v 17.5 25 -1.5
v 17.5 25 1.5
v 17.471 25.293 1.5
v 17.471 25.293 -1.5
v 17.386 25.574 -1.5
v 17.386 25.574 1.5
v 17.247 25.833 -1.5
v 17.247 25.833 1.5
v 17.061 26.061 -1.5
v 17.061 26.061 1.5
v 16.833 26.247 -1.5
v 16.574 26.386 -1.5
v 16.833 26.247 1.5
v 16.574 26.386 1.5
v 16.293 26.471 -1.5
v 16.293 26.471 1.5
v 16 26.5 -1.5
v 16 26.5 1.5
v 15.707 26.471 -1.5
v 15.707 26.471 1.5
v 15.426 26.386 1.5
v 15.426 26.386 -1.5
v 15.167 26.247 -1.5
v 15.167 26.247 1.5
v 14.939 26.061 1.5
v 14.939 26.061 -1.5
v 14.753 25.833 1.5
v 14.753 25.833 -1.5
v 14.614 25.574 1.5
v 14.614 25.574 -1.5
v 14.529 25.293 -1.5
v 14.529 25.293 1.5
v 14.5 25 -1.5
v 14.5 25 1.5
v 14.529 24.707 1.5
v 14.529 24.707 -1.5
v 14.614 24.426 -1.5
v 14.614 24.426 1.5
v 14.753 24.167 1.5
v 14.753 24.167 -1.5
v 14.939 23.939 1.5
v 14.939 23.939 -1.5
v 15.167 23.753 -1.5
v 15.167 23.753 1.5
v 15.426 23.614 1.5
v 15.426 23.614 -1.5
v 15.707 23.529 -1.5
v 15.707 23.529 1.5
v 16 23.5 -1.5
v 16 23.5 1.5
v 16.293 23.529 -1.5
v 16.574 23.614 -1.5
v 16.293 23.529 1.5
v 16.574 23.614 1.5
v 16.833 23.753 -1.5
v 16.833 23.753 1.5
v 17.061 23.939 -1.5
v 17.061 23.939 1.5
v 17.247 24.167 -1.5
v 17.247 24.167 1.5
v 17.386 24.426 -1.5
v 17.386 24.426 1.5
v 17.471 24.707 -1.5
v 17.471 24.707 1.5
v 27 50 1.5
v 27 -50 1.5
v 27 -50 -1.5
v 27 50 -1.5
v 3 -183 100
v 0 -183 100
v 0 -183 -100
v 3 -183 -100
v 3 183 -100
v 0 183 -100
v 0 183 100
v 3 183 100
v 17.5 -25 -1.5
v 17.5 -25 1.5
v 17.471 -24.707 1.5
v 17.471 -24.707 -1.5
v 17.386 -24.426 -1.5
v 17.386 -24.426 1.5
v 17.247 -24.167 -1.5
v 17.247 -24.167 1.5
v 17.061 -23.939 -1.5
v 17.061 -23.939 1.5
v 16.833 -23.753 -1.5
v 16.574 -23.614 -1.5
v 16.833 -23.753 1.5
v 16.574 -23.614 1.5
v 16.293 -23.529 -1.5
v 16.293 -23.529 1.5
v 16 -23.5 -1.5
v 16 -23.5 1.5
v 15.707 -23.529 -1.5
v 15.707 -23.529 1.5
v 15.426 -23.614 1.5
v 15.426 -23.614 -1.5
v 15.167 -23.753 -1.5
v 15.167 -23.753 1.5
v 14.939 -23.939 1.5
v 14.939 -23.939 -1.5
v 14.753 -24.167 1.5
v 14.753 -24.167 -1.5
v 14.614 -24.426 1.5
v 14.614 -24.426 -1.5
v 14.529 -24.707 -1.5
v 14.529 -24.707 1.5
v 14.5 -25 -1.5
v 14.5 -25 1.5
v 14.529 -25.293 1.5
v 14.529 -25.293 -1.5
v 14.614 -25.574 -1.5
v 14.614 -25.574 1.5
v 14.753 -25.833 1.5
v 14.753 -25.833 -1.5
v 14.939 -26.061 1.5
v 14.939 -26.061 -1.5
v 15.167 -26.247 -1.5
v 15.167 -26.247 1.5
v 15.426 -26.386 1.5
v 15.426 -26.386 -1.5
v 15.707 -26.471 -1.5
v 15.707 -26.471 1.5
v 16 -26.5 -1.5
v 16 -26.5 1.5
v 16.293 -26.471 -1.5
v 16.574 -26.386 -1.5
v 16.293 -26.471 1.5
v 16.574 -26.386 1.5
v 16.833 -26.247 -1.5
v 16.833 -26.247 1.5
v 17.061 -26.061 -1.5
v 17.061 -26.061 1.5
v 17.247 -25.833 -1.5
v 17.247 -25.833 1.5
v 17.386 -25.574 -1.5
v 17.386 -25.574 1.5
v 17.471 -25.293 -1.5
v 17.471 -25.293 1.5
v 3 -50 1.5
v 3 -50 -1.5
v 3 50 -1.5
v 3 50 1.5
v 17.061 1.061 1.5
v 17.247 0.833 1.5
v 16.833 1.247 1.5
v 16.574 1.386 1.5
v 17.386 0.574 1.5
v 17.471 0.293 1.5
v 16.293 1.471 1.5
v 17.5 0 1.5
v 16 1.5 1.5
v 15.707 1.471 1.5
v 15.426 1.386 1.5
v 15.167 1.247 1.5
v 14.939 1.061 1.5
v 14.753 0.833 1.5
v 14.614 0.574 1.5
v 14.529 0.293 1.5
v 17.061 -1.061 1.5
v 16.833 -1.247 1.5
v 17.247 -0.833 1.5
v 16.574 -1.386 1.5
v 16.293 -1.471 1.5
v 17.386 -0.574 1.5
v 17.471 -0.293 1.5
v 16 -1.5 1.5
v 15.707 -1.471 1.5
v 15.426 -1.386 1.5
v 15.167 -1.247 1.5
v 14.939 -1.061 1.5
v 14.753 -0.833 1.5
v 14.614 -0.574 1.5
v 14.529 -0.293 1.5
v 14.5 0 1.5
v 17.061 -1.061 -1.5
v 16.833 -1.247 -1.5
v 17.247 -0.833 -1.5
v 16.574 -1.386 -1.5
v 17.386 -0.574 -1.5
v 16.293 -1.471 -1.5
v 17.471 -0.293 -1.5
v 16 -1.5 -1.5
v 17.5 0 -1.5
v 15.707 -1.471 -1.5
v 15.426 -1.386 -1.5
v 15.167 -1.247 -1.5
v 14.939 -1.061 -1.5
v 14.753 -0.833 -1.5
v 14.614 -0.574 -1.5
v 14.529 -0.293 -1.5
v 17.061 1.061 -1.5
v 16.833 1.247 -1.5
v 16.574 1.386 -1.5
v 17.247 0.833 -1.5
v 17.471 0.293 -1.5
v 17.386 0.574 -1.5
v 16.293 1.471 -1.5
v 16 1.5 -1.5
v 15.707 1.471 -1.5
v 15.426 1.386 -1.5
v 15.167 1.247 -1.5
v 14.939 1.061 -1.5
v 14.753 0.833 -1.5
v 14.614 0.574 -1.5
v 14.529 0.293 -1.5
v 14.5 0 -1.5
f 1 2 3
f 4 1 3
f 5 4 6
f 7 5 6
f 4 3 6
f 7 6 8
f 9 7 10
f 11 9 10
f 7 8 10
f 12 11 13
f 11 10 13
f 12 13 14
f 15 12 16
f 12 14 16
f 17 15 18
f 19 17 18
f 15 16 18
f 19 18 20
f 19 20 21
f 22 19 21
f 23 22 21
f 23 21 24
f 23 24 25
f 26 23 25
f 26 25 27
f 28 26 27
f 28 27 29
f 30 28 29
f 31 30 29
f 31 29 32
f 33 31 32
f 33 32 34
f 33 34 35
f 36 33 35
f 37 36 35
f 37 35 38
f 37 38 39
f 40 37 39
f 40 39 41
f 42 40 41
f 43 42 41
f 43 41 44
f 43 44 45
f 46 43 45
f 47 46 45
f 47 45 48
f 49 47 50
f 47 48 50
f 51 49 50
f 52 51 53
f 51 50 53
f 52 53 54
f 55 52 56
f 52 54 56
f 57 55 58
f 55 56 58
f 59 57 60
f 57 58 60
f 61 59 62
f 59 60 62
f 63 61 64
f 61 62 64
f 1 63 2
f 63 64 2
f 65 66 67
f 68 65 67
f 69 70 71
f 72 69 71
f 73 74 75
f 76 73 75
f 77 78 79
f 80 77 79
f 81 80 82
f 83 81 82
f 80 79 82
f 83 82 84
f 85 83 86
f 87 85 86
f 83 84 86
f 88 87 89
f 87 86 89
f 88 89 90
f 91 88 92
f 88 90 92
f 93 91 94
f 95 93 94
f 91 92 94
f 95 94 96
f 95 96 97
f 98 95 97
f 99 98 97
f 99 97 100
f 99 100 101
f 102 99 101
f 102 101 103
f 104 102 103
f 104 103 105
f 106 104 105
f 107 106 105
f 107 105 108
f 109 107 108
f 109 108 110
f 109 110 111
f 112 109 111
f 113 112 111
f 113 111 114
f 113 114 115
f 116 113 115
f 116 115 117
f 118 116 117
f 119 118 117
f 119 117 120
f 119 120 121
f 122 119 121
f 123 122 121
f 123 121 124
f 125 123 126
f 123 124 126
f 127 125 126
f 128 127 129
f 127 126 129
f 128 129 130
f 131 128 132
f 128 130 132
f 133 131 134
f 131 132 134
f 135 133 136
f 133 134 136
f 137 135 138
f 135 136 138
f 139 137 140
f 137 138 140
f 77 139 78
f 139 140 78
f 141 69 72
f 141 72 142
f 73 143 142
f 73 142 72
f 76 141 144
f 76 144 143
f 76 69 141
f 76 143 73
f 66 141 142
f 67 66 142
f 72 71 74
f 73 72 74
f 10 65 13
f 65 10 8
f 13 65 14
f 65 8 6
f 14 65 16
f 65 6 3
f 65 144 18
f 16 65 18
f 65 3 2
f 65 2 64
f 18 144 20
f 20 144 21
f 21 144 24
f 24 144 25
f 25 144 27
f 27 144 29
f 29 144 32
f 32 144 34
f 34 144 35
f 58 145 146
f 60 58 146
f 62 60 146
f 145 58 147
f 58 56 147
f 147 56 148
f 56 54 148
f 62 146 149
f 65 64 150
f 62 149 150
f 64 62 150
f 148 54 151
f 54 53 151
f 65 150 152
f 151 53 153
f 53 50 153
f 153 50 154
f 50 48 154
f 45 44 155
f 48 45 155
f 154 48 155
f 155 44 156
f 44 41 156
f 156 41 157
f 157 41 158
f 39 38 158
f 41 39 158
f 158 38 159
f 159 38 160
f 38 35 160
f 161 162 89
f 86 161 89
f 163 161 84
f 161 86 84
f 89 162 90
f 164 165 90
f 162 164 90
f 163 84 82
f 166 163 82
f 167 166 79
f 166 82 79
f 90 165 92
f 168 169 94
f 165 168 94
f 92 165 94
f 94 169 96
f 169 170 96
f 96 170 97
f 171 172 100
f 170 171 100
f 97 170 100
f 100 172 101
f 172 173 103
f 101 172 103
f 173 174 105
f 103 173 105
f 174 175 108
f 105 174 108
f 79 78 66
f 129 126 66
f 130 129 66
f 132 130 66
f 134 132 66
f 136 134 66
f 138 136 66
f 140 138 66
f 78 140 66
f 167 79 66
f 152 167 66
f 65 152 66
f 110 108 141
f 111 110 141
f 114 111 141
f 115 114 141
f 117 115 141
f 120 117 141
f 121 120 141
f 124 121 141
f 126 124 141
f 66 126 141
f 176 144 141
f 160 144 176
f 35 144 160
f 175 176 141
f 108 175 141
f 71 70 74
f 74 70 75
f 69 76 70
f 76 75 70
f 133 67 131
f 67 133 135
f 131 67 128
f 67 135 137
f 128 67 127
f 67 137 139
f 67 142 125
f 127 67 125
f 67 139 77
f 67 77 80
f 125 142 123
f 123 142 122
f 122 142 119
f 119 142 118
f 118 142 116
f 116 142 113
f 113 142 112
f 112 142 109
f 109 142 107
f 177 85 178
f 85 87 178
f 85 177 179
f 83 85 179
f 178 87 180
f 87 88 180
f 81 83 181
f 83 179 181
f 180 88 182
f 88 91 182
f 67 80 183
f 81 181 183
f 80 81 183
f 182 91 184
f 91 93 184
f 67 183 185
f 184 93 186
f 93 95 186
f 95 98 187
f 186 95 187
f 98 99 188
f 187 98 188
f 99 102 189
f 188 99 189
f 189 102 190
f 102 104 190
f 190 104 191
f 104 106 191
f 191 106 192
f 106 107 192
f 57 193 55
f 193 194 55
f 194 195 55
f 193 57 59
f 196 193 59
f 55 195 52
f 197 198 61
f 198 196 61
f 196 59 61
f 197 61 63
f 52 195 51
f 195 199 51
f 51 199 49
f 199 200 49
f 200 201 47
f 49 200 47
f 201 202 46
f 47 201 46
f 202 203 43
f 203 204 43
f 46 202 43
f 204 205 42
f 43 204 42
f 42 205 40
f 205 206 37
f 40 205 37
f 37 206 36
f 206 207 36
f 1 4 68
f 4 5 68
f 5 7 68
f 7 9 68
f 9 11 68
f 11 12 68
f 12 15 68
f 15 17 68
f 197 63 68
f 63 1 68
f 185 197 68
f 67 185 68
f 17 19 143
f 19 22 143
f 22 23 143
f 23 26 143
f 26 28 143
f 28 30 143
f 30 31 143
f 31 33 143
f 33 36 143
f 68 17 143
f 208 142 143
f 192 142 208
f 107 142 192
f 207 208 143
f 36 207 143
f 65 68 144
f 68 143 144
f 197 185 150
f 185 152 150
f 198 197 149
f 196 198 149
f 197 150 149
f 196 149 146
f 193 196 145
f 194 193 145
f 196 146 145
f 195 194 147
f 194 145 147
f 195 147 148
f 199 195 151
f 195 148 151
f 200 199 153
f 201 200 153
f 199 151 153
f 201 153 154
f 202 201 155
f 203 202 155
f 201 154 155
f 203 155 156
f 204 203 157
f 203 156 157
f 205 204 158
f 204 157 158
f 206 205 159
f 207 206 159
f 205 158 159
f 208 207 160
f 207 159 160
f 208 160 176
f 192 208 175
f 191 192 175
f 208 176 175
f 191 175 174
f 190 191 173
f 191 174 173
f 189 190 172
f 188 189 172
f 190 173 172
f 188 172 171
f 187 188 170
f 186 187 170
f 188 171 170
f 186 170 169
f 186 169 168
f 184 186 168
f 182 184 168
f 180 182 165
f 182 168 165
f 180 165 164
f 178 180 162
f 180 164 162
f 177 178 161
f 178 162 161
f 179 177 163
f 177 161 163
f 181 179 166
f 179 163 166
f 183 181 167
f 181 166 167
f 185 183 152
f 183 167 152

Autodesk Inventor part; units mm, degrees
ref_plane "YZ Plane" through (0, 0, 0) normal (1, 0, 0) x (0, 1, 0)
ref_plane "XZ Plane" through (0, 0, 0) normal (0, 1, 0) x (-1, 0, 0)
ref_plane "XY Plane" through (0, 0, 0) normal (0, 0, 1) x (1, 0, 0)
sketch "Sketch1" plane through (0, 0, 0) normal (1, 0, 0) x (0, 1, 0)
  line L0 (183, 100) -> (-183, 100)
  line L1 (-183, 100) -> (-183, -100)
  line L2 (-183, -100) -> (183, -100)
  line L3 (183, -100) -> (183, 100)
  line L4 (183, 100) -> (-183, -100) construction
  line L5 (-183, 100) -> (183, -100) construction
  point P0 (0, 0)
  dimension "d0" = 366
  dimension "d1" = 200
extrude "Extrusion1" add sketch "Sketch1" along normal blind 3
sketch "Sketch7" plane through (3, 0, 0) normal (1, 0, 0) x (0, 0, -1)
  line L0 (1.5, 50) -> (-1.5, 50)
  line L1 (-1.5, 50) -> (-1.5, -50)
  line L2 (-1.5, -50) -> (1.5, -50)
  line L3 (1.5, -50) -> (1.5, 50)
  line L4 (1.5, 50) -> (-1.5, -50) construction
  line L5 (-1.5, 50) -> (1.5, -50) construction
  point P0 (0, 0)
  dimension "d69" = 3
  dimension "d70" = 100
extrude "Extrusion10" add sketch "Sketch7" along normal blind 24
sketch "Sketch8" plane through (3, -50, 1.5) normal (0, 0, 1) x (1, 0, 0)
  circle A0 centre (13, 75) radius 1.5
  circle A1 centre (13, 50) radius 1.5
  circle A2 centre (13, 25) radius 1.5
  line L0 (0, 100) -> (24, 100) projected
  line L1 (0, 0) -> (24, 0) projected
  line L2 (24, 100) -> (24, 0) projected
  line L3 (0, 233) -> (0, -133) projected
  point P0 (-3, 50)
  dimension "d73" = 3
  dimension "d74" = 3
  dimension "d75" = 3
  dimension "d76" = 25
  dimension "d77" = 25
  dimension "d78" = 25
  dimension "d87" = 25
  dimension "d88" = 11
  dimension "d89" = 11
  dimension "d90" = 11
extrude "Extrusion11" cut sketch "Sketch8" against normal blind 25 contours A0 | A1 | A2
properties part number "down_cover"
